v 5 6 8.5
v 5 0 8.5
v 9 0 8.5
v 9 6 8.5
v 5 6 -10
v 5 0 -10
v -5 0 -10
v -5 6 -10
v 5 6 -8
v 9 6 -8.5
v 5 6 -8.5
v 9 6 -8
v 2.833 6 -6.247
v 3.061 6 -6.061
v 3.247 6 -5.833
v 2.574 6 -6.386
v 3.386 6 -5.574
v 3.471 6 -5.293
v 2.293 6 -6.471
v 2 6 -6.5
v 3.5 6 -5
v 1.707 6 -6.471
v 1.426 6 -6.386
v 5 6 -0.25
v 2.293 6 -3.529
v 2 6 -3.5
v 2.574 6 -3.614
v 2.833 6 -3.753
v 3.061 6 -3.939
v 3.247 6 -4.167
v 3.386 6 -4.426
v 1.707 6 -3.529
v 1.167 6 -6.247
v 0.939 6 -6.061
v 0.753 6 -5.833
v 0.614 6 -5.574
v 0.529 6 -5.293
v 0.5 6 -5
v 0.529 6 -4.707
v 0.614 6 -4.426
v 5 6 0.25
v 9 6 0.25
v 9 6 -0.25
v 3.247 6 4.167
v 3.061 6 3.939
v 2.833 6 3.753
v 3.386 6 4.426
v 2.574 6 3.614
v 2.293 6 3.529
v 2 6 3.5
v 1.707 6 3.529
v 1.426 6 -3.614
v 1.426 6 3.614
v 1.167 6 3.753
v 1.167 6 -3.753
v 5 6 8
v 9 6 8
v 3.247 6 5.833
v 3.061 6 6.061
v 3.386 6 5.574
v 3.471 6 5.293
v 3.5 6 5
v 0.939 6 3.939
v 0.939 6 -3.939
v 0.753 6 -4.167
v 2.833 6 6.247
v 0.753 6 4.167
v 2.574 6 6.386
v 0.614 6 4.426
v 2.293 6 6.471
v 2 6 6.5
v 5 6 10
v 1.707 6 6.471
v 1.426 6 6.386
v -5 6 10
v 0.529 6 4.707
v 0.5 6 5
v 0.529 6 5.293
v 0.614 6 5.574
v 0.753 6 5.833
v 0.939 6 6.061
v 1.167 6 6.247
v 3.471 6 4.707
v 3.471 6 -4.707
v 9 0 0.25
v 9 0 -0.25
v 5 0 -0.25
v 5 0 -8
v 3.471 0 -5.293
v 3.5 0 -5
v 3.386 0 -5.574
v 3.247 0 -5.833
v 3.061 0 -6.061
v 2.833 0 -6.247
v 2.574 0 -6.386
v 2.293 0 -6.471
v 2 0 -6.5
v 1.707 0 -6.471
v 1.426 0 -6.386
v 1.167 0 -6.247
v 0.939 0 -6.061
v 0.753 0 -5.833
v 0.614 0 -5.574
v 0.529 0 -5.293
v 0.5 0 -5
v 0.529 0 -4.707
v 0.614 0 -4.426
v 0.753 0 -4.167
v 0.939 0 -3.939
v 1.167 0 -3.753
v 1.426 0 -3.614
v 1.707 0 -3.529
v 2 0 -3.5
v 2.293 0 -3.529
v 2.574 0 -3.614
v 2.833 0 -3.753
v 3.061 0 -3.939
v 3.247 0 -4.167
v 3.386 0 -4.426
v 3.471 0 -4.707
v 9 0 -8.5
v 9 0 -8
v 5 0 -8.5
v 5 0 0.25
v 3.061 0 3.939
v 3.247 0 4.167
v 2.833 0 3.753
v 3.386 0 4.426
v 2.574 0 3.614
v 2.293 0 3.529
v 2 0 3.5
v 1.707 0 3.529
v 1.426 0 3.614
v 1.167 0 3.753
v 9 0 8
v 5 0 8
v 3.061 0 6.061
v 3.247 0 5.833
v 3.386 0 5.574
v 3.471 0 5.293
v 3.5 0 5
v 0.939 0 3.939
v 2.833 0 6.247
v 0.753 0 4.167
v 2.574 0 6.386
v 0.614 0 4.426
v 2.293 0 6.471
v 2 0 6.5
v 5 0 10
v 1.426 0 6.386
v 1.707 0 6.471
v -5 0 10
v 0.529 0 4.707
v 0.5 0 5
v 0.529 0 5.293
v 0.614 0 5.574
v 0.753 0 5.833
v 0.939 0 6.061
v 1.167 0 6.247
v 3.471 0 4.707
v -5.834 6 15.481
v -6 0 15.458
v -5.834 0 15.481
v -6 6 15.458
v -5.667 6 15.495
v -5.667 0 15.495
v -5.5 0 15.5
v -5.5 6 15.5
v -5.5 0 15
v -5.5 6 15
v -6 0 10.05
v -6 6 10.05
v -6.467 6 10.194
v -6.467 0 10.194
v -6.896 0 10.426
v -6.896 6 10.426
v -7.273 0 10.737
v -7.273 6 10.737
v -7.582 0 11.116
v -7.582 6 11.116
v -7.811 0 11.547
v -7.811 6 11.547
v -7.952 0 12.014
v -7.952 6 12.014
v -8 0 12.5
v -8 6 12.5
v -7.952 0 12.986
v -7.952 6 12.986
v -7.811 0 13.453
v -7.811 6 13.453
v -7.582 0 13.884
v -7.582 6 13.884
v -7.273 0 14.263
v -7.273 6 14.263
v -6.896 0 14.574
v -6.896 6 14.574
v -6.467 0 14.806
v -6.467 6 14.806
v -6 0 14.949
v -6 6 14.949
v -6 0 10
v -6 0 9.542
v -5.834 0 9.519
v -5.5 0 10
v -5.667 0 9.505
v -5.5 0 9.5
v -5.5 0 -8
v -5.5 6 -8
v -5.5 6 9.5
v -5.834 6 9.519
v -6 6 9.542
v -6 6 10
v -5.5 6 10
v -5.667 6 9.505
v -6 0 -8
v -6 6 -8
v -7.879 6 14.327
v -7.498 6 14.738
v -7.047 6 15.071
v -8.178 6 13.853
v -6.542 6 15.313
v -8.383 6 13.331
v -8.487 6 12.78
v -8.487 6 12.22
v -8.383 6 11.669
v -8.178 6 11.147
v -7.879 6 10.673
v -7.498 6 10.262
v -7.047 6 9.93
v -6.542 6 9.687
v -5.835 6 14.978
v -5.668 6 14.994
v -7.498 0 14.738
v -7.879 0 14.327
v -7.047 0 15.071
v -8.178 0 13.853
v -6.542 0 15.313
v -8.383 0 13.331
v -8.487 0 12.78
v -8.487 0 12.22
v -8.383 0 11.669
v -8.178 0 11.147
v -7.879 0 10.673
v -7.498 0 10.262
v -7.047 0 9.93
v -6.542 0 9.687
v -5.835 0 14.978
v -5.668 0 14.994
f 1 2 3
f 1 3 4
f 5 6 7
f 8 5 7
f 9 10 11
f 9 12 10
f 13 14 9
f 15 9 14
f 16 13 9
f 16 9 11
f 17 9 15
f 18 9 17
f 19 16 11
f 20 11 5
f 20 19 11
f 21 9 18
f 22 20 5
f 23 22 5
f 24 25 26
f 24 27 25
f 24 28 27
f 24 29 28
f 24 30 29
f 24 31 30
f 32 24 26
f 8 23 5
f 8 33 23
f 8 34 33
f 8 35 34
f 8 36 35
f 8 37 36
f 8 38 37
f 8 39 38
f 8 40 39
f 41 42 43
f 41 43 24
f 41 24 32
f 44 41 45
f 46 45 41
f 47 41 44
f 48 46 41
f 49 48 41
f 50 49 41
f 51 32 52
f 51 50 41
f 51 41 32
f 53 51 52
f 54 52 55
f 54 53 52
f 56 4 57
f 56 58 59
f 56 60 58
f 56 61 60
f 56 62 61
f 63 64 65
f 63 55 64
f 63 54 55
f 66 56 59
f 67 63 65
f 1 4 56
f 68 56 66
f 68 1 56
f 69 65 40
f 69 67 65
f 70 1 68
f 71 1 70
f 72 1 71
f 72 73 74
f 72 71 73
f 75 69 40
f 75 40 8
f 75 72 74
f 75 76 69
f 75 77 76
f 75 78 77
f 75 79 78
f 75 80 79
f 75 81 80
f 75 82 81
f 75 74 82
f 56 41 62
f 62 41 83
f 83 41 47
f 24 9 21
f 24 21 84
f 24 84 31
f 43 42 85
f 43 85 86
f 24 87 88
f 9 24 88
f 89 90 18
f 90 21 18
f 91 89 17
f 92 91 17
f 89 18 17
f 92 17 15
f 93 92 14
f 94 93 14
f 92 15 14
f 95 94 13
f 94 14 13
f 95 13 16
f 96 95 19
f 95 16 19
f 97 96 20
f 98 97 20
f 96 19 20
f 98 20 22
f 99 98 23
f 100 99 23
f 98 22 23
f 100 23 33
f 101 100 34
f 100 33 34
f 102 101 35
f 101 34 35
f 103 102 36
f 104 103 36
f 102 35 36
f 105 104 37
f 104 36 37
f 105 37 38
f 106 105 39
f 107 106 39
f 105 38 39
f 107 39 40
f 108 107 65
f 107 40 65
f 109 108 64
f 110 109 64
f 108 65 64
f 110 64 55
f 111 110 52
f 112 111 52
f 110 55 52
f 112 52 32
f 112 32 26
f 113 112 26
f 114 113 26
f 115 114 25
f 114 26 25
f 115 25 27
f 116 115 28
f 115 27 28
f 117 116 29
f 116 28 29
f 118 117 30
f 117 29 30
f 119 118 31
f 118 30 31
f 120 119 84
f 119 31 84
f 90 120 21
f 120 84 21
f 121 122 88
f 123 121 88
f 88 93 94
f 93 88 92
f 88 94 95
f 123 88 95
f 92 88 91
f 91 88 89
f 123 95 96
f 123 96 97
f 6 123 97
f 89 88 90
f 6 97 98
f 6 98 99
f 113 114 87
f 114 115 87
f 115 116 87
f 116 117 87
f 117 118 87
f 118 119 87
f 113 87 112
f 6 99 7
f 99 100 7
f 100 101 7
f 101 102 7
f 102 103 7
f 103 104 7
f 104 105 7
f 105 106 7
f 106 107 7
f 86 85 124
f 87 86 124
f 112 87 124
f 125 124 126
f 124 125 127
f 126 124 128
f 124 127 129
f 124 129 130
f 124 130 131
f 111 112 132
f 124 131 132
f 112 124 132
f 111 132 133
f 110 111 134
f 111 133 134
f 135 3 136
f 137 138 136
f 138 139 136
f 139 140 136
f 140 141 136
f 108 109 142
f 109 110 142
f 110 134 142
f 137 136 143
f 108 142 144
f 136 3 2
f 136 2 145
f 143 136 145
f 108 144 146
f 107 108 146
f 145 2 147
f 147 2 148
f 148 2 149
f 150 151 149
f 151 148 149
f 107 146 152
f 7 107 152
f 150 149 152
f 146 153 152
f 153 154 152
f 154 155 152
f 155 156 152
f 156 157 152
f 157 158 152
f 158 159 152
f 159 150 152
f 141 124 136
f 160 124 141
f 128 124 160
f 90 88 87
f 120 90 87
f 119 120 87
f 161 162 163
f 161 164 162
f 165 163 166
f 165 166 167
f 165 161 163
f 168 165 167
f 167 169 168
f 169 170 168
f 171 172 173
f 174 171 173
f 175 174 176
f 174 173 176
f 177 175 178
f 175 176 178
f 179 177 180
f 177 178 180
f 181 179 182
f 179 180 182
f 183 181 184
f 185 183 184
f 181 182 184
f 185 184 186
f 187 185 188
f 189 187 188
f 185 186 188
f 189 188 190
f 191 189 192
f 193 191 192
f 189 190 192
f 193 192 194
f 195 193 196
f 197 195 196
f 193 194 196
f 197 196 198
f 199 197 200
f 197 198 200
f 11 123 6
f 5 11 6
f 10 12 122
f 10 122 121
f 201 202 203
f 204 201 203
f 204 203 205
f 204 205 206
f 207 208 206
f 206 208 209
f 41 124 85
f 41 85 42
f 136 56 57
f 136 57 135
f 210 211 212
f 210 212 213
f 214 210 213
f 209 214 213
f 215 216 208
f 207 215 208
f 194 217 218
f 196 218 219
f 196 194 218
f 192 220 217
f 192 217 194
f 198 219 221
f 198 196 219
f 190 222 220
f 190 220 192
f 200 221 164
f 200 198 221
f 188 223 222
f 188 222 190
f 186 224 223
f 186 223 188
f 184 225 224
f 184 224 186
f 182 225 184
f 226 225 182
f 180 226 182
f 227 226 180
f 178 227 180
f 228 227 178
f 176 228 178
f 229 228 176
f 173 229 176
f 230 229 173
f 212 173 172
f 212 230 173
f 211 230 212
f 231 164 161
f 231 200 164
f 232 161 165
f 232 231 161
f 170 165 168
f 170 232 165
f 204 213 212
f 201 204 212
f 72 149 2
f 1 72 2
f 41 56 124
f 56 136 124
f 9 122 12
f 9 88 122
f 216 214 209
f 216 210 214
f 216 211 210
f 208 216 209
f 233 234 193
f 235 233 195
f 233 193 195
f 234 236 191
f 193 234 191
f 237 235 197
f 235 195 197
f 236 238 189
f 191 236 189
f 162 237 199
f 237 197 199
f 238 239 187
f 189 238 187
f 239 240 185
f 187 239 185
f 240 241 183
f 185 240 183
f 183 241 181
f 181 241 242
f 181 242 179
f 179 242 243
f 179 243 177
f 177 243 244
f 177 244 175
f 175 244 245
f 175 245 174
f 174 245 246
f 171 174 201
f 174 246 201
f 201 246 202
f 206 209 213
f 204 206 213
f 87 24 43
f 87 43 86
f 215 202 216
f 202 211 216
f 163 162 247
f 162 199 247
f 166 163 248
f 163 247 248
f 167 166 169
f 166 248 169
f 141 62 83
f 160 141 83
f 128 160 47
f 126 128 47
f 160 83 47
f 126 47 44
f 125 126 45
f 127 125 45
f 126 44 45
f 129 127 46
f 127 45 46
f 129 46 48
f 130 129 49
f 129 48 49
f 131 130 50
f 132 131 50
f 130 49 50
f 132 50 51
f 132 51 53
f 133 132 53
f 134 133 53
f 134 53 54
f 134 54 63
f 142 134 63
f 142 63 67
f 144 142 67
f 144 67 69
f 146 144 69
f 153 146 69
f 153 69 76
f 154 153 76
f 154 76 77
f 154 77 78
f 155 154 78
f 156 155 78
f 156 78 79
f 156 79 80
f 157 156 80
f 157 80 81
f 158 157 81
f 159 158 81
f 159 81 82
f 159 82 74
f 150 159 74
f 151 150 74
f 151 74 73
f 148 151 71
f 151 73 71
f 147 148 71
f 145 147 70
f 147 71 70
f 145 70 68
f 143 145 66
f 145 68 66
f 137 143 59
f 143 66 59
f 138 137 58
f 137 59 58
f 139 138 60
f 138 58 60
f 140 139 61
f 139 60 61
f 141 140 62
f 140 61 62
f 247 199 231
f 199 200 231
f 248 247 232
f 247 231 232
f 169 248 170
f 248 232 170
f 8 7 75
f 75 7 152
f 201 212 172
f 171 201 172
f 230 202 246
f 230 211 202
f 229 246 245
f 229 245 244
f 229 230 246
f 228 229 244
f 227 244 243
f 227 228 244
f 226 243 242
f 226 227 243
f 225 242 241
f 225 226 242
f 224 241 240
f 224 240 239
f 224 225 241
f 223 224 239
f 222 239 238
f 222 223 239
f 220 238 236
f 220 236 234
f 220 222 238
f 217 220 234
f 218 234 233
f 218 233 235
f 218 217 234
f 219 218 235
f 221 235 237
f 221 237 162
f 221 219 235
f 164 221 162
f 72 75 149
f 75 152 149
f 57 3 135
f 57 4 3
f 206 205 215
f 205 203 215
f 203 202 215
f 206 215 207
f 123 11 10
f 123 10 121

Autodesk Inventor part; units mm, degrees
ref_plane "YZ Plane" through (0, 0, 0) normal (1, 0, 0) x (0, 1, 0)
ref_plane "XZ Plane" through (0, 0, 0) normal (0, 1, 0) x (-1, 0, 0)
ref_plane "XY Plane" through (0, 0, 0) normal (0, 0, 1) x (1, 0, 0)
sketch "Esquisse1" plane through (0, 0, 0) normal (0, 1, 0) x (-1, 0, 0)
  line L0 (5, 10) -> (-5, 10)
  line L1 (-5, 10) -> (-5, -10)
  line L2 (-5, -10) -> (5, -10)
  line L3 (5, -10) -> (5, 10)
  point P0 (0, 0)
  dimension "d0" = 10
  dimension "d1" = 20
  dimension "d2" = 10
  dimension "d3" = 5
extrude "Extrusion1" add sketch "Esquisse1" along normal blind 6
sketch "Esquisse2" plane through (0, 6, 0) normal (0, 1, 0) x (1, 0, 0)
  circle A0 centre (2, -5) radius 1.5
  circle A1 centre (2, 5) radius 1.5
  line L0 (5, -10) -> (5, 10) projected
  line L1 (-5, -10) -> (5, -10) projected
  line L2 (5, 10) -> (-5, 10) projected
  point P0 (0, 0)
  dimension "d6" = 3
  dimension "d7" = 3
  dimension "d8" = 5
  dimension "d9" = 5
  dimension "d10" = 3
  dimension "d11" = 3
extrude "Extrusion2" cut sketch "Esquisse2" against normal through all
sketch "Esquisse3" plane through (5, 0, 10) normal (1, 0, 0) x (0, 0, -1)
  line L0 (1.5, 6) -> (2, 6)
  line L1 (2, 6) -> (2, 0)
  line L2 (2, 0) -> (1.5, 0)
  line L3 (1.5, 0) -> (1.5, 6)
  line L4 (18, 6) -> (18.5, 6)
  line L5 (18.5, 6) -> (18.5, 0)
  line L6 (18.5, 0) -> (18, 0)
  line L7 (18, 0) -> (18, 6)
  line L8 (9.75, 6) -> (10.25, 6)
  line L9 (10.25, 6) -> (10.25, 0)
  line L10 (10.25, 0) -> (9.75, 0)
  line L11 (9.75, 0) -> (9.75, 6)
  line L12 (0, 6) -> (20, 6) projected
  line L13 (0, 0) -> (20, 0) projected
  line L14 (0, 0) -> (0, 6) projected
  line L15 (20, 0) -> (20, 6) projected
  point P0 (10, 0)
  dimension "d14" = 1.5
  dimension "d15" = 1.5
  dimension "d16" = 0.5
  dimension "d17" = 0.5
  dimension "d18" = 0.5
  dimension "d19" = 16
  dimension "d20" = 7.75
extrude "Extrusion3" add sketch "Esquisse3" along normal blind 4 contours L0 L1 L2 L3 | L8 L9 L10 L11 | L4 L5 L6 L7
sketch "Esquisse4" plane through (0, 6, 0) normal (0, 1, 0) x (1, 0, 0)
  line L0 (-6, 8) -> (-5.5, 8)
  line L1 (-5.5, 8) -> (-5.5, -9.5)
  line L2 (-5.5, -10) -> (-6, -10)
  line L3 (-6, -10) -> (-6, -9.542)
  line L4 (-5.5, -10) -> (-5.5, -15.5)
  arc A0 (-6, -10.0505) -> (-5.5, -15) centre (-5.5, -12.5) ccw
  arc A1 (-6, -9.542) -> (-5.5, -15.5) centre (-5.5, -12.5) ccw
  line L5 (-5, 10) -> (-5, -10) projected
  line L6 (5, 8) -> (9, 8) projected
  line L7 (-5, -10) -> (5, -10) projected
  line L8 (-6, -10) -> (-6, -10.0505)
  line L9 (-5.5, -9.5) -> (-5.5, -10)
  line L10 (-6, -9.542) -> (-6, 8)
  line L11 (-6, -10.0505) -> (-6, -15.458)
  arc A2 (-5.5, -10) -> (-6, -10.0505) centre (-5.5, -12.5) ccw
  arc A3 (-5.5, -9.5) -> (-6, -9.542) centre (-5.5, -12.5) ccw
  arc A4 (-5.5, -15) -> (-5.5, -10) centre (-5.5, -12.5) ccw
  arc A5 (-5.5, -15.5) -> (-5.5, -9.5) centre (-5.5, -12.5) ccw
  point P0 (0, 0)
  dimension "d23" = 0.5
  dimension "d24" = 0.5
  dimension "d25" = 0.5
  dimension "d27" = 5
extrude "Extrusion4" add sketch "Esquisse4" against normal blind 6 contours L0 L1 A3 L10 | A3 L9 L2 L3 | L3 L8 A0 L11 A1 | L11 A0 L4 A1
equation "\"d2\" = 0.5 * d1"
equation "\"d3\" = 0.5 * d0"
equation "\"d20\" = -0.5 * d18 + 0.5 * d19"
properties part number "bumper"
